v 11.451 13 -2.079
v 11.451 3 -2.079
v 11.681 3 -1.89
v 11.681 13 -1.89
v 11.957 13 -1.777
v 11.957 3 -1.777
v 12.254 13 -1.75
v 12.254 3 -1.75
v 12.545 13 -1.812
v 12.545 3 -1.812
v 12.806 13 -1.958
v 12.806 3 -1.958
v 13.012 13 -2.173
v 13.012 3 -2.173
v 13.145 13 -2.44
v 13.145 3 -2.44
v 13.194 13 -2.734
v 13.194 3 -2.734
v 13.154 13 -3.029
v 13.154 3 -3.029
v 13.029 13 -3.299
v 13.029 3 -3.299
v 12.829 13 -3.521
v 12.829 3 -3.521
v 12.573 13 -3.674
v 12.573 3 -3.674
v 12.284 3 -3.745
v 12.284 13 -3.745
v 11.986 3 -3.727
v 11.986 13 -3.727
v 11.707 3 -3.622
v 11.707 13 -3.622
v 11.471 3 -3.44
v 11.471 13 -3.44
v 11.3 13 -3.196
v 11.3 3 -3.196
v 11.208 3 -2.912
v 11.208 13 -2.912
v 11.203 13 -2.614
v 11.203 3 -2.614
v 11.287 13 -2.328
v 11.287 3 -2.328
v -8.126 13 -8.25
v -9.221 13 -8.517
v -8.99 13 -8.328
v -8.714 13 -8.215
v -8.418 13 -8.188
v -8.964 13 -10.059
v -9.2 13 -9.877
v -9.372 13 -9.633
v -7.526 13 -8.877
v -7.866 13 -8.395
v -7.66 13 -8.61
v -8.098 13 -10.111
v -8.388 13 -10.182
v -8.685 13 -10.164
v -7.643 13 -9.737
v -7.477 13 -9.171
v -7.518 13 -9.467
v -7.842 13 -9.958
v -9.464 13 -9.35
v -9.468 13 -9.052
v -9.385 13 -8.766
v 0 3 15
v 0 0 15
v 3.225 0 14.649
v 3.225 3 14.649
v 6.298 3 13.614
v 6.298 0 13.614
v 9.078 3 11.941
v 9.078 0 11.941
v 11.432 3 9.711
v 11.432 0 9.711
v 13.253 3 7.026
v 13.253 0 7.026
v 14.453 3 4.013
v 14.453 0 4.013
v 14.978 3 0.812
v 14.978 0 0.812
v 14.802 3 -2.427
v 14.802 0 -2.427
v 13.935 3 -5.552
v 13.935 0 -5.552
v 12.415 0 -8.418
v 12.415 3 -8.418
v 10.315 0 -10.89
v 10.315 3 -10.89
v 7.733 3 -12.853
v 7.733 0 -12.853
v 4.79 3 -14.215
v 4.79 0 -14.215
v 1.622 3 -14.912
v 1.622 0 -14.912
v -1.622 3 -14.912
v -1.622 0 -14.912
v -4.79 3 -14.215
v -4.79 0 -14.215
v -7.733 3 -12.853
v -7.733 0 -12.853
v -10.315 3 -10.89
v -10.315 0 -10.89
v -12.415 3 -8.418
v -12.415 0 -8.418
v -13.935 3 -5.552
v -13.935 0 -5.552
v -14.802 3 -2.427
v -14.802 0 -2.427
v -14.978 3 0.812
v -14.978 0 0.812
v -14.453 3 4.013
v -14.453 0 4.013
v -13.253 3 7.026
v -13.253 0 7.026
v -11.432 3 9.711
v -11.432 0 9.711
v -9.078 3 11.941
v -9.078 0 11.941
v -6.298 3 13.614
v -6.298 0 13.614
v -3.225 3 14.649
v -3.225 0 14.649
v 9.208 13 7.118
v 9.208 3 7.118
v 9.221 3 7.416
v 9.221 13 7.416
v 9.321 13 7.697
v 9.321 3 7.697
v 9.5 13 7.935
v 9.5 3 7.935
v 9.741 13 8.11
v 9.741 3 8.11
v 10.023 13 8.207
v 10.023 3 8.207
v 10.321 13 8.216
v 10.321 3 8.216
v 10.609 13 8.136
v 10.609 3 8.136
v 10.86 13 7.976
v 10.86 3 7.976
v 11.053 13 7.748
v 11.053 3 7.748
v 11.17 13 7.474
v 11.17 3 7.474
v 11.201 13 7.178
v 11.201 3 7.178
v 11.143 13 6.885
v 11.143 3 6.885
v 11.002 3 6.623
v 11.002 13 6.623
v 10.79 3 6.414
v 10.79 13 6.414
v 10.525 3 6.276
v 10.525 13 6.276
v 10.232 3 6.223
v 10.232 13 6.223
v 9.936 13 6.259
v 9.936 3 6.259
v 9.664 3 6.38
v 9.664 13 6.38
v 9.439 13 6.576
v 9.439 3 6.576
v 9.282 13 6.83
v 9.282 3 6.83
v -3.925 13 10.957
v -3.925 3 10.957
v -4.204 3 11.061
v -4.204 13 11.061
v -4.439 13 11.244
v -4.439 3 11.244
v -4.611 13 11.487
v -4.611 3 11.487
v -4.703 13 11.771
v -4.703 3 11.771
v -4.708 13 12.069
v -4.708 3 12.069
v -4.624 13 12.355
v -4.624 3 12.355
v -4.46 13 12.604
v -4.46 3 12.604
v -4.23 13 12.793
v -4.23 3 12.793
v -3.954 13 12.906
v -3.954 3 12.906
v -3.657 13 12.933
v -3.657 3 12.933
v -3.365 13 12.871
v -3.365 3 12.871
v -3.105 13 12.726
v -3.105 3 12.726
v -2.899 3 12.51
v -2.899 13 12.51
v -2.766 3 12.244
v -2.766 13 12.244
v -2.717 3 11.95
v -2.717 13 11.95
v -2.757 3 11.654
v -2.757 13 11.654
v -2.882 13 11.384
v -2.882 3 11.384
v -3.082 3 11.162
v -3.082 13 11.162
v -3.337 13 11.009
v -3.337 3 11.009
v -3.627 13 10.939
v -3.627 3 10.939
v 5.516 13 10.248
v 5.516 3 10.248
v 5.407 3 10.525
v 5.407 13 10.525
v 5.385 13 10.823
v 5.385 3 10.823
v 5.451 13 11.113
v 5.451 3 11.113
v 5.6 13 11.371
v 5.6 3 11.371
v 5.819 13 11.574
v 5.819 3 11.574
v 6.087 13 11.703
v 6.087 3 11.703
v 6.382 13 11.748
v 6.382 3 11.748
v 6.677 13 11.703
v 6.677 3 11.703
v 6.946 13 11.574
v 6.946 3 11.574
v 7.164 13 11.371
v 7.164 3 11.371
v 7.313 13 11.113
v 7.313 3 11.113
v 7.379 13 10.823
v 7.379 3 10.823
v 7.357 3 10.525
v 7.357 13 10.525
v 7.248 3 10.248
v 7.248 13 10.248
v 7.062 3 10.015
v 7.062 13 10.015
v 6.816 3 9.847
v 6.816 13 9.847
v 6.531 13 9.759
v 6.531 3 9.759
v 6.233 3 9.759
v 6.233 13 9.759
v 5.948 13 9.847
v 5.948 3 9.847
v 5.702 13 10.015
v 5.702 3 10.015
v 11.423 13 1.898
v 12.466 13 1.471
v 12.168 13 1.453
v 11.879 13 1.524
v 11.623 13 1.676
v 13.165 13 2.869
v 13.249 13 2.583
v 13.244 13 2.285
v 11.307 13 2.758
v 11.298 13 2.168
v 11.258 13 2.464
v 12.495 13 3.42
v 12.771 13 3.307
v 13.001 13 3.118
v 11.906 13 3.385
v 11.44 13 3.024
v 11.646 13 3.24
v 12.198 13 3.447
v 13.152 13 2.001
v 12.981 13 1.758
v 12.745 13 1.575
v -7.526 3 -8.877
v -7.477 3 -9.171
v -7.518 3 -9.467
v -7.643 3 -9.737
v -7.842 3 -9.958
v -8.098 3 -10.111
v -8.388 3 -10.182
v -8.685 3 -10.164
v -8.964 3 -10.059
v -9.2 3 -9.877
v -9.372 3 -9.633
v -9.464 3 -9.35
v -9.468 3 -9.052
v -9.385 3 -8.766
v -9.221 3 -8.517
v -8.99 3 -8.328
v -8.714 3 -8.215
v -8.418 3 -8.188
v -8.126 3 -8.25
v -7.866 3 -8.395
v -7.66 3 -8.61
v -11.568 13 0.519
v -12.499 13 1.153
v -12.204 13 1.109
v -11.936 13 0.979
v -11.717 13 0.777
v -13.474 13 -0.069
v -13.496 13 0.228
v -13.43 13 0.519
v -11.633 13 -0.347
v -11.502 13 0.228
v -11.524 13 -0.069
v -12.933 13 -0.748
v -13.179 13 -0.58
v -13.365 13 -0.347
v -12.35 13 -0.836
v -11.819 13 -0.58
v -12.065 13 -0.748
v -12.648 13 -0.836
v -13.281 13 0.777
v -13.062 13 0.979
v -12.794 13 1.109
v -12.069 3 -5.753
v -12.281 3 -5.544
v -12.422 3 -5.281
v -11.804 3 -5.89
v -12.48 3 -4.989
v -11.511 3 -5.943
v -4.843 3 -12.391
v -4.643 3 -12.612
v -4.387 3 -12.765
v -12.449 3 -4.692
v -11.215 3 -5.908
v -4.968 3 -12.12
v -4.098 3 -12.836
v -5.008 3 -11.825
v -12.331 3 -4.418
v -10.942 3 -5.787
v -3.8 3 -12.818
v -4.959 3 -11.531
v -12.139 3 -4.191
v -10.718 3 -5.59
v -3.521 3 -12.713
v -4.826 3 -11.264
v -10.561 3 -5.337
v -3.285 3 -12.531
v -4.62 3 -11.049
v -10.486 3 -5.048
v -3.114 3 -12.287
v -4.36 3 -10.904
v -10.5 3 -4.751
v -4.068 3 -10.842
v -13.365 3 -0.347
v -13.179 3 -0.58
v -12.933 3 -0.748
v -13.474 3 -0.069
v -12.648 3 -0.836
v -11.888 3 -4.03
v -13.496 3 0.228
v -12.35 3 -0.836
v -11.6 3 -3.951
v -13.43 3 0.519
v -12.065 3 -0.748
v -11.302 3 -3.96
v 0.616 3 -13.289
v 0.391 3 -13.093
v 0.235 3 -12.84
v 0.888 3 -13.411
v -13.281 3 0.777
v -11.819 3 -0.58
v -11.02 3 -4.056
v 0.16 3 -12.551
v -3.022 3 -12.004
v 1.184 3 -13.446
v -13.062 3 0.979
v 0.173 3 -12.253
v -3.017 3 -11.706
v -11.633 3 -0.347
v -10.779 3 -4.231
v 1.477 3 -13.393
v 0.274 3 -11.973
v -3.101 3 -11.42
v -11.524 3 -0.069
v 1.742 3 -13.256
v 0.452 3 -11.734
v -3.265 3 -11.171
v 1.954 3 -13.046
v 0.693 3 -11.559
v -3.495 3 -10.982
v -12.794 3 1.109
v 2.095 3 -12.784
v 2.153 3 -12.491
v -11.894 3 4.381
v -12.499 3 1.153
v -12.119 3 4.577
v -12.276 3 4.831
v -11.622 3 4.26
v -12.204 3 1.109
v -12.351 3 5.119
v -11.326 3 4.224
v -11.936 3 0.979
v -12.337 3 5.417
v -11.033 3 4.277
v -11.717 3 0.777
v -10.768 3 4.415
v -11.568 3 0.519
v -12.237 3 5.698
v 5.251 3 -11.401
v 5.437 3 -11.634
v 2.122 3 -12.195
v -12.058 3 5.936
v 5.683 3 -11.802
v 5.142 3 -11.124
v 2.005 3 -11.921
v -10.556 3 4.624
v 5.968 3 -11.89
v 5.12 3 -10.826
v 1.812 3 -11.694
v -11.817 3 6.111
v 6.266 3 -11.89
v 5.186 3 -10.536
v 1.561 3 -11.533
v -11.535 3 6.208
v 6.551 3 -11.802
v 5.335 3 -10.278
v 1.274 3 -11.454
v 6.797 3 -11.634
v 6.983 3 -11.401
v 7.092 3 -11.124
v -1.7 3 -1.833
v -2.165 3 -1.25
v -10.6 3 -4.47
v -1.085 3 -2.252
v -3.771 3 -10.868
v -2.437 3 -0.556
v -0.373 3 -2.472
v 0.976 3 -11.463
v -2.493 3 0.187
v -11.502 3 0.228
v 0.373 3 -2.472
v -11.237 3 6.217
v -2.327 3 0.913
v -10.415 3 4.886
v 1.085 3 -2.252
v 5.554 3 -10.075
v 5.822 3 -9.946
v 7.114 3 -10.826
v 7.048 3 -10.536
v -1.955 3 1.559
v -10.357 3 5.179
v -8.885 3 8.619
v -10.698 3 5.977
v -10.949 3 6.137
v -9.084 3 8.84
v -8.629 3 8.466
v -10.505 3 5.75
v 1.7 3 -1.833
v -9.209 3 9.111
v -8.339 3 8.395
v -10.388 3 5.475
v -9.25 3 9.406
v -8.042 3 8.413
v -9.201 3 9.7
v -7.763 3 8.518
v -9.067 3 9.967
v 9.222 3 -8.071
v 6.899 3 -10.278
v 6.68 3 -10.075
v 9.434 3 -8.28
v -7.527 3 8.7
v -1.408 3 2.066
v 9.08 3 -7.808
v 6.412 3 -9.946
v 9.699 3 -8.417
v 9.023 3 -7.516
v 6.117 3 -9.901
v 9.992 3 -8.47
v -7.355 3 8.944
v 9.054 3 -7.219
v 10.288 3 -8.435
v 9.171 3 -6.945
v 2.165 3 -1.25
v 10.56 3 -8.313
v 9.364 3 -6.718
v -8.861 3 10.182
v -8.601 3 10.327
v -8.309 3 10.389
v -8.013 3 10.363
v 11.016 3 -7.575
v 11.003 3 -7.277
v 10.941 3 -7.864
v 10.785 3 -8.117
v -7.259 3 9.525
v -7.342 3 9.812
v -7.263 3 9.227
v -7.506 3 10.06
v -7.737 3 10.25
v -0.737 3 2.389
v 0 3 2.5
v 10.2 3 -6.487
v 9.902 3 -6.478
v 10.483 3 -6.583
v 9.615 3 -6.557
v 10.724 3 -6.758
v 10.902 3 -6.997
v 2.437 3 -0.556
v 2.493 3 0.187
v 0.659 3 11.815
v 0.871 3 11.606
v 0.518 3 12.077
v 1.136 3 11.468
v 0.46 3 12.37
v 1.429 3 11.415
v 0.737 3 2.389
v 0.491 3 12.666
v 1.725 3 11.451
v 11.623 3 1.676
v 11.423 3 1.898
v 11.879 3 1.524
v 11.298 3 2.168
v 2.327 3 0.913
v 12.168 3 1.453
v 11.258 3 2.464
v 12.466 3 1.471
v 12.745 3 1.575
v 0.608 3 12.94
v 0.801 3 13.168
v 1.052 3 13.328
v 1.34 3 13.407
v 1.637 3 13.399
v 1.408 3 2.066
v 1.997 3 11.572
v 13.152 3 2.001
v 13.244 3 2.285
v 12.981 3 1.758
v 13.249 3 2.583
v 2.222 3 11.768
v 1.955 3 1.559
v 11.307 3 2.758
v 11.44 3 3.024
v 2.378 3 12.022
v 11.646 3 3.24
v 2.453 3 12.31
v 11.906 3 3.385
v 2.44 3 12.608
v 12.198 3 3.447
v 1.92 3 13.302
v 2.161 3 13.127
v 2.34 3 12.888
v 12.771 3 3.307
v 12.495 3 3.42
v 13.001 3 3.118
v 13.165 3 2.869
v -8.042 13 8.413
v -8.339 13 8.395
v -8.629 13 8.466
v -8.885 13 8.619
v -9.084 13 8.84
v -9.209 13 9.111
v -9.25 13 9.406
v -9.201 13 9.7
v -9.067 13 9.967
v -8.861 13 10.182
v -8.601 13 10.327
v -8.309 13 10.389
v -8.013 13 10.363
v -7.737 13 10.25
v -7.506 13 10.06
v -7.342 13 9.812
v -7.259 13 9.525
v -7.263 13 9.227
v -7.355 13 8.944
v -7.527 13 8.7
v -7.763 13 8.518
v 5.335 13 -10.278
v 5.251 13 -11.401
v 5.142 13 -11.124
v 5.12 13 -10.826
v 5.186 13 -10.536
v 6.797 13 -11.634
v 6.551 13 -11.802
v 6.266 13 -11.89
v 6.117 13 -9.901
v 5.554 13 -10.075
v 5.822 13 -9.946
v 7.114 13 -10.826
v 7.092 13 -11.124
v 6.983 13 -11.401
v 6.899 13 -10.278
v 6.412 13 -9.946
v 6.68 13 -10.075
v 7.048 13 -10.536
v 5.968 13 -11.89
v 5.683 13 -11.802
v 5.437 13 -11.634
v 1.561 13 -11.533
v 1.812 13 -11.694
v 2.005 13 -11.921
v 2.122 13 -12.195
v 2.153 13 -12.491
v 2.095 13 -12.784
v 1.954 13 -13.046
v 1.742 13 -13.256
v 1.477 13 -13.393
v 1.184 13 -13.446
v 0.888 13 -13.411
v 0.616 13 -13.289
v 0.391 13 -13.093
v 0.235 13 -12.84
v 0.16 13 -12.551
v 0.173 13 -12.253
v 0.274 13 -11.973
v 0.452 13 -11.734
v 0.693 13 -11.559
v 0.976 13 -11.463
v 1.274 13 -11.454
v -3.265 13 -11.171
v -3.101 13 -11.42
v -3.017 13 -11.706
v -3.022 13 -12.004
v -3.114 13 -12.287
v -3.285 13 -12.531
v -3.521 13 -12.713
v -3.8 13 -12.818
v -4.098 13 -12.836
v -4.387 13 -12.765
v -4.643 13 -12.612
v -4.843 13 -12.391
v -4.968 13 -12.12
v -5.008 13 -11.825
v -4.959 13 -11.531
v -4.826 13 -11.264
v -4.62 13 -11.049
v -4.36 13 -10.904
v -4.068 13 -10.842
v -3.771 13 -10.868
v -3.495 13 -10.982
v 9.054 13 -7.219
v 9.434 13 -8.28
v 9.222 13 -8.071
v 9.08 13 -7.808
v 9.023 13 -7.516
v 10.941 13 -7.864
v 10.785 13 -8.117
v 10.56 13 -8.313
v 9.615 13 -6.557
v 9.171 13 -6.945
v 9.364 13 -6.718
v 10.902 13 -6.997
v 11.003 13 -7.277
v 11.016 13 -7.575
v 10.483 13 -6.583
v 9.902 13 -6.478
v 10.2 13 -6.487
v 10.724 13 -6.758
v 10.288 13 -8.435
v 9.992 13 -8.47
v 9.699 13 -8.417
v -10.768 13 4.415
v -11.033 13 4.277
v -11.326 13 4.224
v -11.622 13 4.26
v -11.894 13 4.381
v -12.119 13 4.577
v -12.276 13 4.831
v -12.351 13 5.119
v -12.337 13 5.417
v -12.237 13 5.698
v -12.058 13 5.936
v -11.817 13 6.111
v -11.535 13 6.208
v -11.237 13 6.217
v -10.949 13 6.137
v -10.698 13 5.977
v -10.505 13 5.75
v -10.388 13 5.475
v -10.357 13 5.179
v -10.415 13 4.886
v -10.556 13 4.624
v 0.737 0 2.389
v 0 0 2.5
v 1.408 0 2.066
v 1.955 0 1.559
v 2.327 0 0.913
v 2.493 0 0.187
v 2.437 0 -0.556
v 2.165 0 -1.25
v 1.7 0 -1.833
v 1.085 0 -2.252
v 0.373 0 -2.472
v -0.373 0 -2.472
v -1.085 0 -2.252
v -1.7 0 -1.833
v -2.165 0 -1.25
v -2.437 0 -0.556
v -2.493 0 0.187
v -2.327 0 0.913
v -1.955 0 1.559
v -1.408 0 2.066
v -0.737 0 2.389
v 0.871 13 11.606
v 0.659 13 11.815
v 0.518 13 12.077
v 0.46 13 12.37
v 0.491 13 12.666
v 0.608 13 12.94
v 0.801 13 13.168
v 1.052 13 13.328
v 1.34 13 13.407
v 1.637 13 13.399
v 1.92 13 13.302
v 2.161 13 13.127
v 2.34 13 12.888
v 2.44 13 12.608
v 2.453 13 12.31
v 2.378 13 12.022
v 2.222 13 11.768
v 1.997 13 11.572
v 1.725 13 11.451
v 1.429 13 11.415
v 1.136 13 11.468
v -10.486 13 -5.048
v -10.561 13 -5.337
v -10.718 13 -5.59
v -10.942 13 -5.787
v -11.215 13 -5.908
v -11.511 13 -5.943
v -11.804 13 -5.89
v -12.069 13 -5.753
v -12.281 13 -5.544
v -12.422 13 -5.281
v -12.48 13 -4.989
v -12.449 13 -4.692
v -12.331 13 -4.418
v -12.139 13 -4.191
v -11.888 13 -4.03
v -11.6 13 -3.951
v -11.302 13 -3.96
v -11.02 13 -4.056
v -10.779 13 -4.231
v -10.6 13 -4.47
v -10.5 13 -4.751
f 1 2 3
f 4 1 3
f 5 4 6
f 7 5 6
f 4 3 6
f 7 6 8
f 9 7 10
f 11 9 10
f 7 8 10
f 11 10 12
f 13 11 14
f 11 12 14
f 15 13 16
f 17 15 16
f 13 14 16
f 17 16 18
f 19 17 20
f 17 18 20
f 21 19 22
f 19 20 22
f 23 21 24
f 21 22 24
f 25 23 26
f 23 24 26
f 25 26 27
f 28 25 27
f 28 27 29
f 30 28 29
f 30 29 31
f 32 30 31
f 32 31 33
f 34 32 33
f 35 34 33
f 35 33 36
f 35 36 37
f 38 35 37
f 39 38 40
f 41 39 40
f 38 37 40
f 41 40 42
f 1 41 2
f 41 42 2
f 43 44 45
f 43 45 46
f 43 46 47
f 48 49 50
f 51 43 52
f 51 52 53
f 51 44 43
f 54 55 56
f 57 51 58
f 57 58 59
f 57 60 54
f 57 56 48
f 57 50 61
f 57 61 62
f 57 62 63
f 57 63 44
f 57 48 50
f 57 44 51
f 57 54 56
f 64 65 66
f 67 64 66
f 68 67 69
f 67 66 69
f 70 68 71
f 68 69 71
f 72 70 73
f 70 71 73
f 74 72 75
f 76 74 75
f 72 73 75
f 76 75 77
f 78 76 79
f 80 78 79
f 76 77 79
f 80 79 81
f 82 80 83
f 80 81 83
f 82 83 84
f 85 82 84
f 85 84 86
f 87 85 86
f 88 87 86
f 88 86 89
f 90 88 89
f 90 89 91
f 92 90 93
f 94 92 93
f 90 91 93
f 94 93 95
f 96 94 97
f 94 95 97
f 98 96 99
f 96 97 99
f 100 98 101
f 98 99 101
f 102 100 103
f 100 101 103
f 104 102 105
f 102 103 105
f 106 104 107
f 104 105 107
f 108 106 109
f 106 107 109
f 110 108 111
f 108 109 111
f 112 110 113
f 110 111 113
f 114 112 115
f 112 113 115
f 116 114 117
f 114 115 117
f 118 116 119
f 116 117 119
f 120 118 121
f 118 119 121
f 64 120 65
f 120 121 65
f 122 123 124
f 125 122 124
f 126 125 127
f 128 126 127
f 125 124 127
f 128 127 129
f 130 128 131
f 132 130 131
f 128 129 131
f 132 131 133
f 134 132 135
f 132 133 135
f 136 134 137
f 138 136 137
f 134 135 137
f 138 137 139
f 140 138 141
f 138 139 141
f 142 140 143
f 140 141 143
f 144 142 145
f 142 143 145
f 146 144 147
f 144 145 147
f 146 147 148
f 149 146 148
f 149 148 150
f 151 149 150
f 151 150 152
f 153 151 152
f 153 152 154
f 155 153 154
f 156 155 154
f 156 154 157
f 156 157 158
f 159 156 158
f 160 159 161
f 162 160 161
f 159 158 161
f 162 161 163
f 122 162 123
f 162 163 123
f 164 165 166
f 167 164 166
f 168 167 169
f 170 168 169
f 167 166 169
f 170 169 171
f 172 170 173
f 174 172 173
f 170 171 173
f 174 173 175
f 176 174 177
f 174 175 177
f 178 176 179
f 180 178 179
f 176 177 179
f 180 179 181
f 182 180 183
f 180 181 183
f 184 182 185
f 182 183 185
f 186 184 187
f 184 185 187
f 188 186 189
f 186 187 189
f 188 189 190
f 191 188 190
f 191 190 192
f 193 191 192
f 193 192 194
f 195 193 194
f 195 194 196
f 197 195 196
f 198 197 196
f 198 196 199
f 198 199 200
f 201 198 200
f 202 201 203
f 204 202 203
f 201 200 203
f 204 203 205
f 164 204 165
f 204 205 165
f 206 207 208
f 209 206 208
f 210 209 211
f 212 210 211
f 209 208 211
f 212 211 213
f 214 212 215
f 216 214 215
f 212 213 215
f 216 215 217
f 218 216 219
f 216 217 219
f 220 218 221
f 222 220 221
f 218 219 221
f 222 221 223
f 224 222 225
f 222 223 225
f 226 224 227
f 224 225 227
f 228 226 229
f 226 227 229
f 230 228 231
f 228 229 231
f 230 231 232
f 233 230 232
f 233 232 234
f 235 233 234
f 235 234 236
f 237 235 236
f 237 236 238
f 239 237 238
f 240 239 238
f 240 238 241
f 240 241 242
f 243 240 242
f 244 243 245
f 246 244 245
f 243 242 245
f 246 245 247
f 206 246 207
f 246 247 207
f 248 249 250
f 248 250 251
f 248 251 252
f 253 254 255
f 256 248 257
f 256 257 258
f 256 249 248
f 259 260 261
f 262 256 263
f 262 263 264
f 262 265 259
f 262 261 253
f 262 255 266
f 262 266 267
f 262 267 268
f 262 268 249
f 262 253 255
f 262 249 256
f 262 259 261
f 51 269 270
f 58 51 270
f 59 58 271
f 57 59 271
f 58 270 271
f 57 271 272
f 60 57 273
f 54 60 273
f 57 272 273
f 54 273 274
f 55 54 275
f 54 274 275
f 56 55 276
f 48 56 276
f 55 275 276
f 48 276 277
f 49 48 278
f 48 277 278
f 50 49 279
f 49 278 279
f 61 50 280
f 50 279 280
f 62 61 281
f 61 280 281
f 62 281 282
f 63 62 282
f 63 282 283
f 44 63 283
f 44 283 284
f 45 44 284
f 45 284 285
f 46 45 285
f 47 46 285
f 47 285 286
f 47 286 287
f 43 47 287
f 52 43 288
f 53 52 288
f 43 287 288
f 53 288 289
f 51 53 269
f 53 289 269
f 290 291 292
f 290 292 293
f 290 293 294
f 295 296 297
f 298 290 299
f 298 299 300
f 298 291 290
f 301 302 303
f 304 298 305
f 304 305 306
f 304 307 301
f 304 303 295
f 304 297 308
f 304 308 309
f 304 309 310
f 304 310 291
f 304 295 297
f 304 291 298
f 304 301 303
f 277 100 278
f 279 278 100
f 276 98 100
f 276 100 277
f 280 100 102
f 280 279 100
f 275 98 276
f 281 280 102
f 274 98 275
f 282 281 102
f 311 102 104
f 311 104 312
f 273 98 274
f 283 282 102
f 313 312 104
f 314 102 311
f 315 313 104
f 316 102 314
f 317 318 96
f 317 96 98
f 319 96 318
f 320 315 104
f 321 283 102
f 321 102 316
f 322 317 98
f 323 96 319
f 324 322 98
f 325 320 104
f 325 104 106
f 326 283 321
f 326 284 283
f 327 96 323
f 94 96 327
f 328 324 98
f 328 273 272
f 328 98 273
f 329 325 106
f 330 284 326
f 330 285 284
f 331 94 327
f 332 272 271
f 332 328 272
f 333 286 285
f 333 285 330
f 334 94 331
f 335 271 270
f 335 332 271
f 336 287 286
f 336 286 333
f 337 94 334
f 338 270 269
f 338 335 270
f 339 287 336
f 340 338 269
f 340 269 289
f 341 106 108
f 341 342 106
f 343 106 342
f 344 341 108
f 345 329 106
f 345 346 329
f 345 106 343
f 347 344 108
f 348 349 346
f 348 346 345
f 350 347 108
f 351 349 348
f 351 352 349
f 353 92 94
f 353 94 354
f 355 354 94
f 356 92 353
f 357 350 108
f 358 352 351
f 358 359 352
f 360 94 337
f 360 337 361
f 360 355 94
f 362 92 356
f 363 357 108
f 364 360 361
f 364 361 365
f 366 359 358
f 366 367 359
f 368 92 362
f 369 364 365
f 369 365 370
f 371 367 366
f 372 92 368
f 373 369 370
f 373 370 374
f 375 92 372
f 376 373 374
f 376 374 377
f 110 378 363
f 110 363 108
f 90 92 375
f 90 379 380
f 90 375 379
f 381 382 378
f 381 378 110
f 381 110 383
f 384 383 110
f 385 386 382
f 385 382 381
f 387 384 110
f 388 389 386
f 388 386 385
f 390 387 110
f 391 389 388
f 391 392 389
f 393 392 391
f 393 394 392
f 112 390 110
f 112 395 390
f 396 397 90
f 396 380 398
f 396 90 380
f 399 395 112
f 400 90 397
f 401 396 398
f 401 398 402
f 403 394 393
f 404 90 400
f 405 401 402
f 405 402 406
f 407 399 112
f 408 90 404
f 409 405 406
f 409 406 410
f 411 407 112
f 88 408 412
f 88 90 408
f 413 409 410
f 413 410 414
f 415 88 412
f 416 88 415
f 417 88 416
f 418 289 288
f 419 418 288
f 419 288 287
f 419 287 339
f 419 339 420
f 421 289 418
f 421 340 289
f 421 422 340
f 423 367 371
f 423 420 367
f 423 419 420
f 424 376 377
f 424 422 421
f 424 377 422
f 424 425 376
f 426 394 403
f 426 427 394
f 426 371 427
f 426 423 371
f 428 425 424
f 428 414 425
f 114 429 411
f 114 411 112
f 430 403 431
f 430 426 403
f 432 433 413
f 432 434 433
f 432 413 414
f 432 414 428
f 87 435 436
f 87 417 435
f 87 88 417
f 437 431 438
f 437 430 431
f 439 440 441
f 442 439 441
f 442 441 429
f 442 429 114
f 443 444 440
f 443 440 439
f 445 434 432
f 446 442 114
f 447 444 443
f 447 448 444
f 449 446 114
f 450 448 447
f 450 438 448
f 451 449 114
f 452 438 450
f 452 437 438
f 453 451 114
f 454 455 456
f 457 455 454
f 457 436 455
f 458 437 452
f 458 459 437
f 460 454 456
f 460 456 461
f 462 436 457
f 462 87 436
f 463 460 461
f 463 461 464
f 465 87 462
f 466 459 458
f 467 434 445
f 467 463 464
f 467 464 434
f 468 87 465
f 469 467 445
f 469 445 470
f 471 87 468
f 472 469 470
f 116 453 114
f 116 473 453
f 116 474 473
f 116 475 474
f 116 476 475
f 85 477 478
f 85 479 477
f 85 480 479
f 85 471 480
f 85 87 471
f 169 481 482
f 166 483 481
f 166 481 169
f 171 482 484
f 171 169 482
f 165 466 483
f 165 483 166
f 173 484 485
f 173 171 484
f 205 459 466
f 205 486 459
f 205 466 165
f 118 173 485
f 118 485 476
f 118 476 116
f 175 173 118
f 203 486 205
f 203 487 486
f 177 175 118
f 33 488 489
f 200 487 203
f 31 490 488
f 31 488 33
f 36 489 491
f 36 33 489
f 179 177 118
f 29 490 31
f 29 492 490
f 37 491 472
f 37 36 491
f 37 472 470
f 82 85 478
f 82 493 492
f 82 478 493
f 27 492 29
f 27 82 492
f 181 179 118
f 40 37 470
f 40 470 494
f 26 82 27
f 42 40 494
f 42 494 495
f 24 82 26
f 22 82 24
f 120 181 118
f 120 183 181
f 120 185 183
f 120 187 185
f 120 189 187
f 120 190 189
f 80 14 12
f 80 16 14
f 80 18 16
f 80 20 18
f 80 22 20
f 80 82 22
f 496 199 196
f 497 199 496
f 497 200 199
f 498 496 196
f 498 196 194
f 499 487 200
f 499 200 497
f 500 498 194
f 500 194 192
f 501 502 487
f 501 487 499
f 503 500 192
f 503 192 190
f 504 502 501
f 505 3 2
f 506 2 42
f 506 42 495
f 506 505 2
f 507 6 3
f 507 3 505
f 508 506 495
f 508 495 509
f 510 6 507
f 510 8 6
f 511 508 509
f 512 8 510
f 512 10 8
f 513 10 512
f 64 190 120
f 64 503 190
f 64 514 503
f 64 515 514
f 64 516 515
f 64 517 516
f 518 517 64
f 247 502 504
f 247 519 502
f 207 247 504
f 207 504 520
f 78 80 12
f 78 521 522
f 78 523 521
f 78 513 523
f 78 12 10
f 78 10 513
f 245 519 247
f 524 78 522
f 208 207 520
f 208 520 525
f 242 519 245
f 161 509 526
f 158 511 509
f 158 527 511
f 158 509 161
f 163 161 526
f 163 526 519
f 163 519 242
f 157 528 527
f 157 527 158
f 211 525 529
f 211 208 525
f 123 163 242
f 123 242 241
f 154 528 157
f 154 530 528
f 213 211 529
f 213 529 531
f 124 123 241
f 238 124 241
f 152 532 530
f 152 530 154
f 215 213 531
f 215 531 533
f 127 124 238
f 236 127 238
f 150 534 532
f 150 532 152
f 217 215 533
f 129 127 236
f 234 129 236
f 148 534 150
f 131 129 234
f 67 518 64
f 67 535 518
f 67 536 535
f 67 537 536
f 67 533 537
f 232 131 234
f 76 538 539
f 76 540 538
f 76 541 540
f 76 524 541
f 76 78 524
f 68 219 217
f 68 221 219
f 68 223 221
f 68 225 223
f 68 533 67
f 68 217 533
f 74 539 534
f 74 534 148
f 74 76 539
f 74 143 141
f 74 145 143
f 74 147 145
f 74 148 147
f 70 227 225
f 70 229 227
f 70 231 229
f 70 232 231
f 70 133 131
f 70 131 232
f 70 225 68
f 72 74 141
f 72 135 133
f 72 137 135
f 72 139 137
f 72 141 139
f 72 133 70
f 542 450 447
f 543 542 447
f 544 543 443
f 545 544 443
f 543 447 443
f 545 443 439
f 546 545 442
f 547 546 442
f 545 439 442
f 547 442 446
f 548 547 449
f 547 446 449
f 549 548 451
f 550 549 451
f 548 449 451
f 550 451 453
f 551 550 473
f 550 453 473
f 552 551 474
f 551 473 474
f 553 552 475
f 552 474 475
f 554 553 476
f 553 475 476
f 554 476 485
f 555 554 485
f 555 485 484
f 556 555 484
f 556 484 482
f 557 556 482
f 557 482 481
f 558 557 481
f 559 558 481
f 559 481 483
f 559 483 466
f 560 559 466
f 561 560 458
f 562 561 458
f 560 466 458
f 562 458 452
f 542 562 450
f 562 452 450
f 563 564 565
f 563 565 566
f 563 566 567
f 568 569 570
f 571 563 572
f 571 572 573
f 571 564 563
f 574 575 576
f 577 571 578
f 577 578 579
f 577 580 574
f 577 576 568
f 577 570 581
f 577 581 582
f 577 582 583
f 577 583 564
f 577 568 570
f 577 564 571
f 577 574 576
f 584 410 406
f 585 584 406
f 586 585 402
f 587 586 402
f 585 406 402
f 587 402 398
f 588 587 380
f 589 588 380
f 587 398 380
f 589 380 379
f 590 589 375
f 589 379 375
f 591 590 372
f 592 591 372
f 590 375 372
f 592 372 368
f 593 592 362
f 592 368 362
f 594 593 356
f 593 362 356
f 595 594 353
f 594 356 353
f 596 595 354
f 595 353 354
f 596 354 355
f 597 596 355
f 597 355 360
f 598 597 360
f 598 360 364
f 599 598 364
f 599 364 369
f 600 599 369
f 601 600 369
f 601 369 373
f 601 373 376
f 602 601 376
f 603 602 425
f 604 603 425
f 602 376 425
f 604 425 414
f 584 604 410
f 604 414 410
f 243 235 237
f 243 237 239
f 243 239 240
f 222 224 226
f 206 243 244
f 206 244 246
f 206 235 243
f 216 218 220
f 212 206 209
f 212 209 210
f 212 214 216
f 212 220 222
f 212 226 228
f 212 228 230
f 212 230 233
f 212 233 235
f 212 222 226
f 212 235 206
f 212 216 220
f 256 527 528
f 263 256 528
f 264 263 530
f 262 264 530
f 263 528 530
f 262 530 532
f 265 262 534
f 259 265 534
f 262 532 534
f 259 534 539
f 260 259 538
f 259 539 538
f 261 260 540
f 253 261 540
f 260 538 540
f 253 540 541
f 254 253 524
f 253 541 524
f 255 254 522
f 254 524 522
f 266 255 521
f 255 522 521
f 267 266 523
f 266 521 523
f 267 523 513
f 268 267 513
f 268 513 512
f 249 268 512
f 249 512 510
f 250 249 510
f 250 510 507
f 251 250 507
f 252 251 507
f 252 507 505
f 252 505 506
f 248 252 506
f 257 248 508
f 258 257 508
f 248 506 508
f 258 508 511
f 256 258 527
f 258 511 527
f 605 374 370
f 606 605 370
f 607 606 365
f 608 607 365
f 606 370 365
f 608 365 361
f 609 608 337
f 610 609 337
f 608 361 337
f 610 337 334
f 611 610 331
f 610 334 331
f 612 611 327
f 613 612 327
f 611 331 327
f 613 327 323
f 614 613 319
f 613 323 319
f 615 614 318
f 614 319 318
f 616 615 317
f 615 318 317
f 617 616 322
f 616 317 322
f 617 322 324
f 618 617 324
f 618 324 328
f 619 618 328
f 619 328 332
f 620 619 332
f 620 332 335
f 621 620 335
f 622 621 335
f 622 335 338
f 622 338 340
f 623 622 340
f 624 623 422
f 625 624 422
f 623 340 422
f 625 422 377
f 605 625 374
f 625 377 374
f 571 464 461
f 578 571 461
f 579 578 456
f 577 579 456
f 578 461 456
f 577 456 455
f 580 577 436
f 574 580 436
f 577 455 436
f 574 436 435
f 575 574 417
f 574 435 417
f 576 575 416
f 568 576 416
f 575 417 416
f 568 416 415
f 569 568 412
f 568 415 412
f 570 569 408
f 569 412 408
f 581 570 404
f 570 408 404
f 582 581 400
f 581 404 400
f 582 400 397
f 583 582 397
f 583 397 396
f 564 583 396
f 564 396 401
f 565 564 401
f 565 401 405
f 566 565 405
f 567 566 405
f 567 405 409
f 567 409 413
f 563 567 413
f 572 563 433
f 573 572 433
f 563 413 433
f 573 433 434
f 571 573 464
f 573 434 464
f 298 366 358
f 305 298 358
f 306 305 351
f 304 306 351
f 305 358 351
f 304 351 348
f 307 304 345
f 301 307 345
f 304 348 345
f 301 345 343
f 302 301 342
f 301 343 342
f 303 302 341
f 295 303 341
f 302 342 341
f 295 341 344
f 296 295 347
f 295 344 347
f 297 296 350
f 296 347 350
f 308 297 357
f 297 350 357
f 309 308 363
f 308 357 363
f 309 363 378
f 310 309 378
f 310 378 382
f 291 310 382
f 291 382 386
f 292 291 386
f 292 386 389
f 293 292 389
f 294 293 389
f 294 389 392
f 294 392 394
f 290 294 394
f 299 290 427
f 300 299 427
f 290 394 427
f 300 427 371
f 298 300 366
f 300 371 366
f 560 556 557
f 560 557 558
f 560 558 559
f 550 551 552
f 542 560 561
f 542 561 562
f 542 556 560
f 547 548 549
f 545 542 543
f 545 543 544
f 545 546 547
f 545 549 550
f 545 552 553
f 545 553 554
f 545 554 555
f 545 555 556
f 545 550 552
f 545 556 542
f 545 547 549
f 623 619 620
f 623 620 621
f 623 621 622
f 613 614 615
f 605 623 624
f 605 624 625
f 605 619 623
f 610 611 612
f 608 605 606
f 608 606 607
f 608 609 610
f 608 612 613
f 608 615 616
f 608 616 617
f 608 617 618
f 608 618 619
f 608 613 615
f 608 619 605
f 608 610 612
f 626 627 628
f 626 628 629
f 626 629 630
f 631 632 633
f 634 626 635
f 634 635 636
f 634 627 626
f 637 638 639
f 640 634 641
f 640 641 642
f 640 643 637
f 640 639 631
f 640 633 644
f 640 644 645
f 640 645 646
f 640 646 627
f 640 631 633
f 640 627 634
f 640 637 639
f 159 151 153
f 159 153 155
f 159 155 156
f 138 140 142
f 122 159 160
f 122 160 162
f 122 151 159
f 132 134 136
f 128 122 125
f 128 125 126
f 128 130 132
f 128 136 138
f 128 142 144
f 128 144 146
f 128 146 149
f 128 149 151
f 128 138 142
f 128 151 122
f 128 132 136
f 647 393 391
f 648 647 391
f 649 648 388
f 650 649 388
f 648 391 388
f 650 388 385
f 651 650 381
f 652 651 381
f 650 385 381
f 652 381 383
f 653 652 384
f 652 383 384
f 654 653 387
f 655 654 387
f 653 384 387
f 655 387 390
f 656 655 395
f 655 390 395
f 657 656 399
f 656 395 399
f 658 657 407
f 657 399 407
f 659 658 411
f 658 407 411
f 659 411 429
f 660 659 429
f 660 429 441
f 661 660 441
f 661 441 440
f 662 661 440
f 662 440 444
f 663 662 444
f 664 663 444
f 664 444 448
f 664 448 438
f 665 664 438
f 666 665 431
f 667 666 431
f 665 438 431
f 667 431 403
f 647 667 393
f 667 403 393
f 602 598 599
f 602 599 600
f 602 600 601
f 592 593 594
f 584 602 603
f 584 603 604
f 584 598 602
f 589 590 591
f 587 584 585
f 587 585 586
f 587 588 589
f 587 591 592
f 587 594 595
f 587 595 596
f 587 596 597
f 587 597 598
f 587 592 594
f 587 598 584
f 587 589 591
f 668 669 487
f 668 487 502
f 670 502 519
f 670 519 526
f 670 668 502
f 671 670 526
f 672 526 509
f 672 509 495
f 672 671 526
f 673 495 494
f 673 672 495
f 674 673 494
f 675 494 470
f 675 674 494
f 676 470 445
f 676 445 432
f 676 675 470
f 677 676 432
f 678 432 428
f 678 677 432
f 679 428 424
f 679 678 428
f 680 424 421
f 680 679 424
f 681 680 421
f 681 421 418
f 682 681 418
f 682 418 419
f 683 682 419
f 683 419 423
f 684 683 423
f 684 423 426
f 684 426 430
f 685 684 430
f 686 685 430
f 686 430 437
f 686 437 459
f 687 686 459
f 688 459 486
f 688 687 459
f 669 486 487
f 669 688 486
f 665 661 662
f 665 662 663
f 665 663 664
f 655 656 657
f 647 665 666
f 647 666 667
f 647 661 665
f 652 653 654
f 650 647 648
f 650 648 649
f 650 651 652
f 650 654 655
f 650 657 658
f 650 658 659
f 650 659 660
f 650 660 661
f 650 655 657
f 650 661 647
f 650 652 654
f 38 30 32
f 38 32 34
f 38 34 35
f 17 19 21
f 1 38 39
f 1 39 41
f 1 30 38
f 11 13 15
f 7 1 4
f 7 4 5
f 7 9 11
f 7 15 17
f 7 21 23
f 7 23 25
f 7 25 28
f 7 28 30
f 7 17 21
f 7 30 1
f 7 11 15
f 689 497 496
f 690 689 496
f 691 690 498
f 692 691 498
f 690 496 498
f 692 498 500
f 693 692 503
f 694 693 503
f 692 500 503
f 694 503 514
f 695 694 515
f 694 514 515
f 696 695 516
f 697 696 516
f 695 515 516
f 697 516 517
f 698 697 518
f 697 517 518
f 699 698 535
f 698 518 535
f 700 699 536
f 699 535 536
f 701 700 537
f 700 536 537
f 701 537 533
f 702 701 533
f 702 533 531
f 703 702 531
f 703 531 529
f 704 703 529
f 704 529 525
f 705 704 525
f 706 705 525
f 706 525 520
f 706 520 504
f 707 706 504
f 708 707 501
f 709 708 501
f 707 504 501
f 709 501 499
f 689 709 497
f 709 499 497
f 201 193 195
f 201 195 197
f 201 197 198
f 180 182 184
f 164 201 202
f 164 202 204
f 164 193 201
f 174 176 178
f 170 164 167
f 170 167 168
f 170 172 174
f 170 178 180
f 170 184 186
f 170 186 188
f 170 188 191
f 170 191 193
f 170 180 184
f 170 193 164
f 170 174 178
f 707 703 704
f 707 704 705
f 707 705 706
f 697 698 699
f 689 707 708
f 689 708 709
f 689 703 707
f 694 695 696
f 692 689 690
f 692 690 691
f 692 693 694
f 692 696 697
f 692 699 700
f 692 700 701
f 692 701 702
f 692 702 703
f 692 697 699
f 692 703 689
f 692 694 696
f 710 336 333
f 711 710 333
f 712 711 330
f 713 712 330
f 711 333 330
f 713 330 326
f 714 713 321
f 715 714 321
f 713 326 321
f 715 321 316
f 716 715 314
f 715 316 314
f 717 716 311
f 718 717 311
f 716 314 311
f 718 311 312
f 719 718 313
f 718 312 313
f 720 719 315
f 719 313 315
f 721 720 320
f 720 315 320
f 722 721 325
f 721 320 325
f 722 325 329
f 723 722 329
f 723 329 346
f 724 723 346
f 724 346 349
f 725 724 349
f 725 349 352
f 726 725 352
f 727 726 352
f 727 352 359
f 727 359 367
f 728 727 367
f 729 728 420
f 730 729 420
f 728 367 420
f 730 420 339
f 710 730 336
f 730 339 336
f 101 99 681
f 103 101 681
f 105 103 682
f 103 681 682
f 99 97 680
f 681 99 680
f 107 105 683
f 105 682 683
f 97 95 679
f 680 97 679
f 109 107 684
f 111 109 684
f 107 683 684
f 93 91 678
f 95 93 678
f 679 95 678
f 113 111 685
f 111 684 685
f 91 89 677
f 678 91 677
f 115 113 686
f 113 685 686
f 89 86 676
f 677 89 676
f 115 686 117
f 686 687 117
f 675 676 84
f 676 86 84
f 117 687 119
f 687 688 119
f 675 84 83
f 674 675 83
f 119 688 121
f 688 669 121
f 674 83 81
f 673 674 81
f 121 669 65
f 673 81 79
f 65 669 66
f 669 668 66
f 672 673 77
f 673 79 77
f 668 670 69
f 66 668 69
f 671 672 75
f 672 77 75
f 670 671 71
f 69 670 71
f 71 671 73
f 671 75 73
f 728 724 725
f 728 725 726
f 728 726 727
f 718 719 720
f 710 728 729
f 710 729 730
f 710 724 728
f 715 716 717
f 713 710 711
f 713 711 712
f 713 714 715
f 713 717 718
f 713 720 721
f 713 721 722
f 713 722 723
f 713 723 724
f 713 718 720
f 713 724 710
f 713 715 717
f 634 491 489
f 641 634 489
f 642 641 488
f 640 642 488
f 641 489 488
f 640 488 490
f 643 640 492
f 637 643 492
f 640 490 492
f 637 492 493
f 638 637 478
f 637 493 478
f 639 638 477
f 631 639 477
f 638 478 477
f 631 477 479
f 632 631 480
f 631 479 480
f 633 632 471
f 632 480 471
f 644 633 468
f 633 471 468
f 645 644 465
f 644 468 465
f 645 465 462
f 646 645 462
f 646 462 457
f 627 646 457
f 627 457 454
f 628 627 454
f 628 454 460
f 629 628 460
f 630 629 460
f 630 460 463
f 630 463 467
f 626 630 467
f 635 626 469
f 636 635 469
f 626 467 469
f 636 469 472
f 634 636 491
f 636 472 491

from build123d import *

# Parameters (mm, degrees)
SKETCH_1_R               = 15
SKETCH_1_R_2             = 2.5
EXTRUDE_1_DEPTH          = 3
SKETCH_2_R               = 1
EXTRUDE_2_DEPTH          = 10
PATTERN_CIRCULAR_1_COUNT = 15


with BuildPart() as part:
    # 草圖1 → 填料-伸長1 (new body)
    with BuildSketch(Plane(origin=(0, 0, 0), x_dir=(1, 0, 0), z_dir=(0, 1, 0))):
        with Locations(Location((0, 0, 0), (0, 0, 270))):
            Circle(SKETCH_1_R)
        with Locations(Location((0, 0, 0), (0, 0, 270))):
            Circle(SKETCH_1_R_2, mode=Mode.SUBTRACT)
    extrude(amount=EXTRUDE_1_DEPTH)

    # 草圖2 → 填料-伸長2 (add)
    with BuildSketch(Plane(origin=(0, 3, 0), x_dir=(1, 0, 0), z_dir=(0, 1, 0))):
        with Locations(Location((6.116820543, 10.901124091, 0), (0, 0, 270))):
            Circle(SKETCH_2_R)
    extrude_2 = extrude(amount=EXTRUDE_2_DEPTH)

    # 環狀複製排列1: 填料-伸長2 ×15 about axis
    pattern_circular_1_axis = Axis((0, 0, 0), (0, 1, 0))
    for i in range(1, PATTERN_CIRCULAR_1_COUNT):
        add(extrude_2.rotate(pattern_circular_1_axis, i * 360 / PATTERN_CIRCULAR_1_COUNT))


solid = part.part
